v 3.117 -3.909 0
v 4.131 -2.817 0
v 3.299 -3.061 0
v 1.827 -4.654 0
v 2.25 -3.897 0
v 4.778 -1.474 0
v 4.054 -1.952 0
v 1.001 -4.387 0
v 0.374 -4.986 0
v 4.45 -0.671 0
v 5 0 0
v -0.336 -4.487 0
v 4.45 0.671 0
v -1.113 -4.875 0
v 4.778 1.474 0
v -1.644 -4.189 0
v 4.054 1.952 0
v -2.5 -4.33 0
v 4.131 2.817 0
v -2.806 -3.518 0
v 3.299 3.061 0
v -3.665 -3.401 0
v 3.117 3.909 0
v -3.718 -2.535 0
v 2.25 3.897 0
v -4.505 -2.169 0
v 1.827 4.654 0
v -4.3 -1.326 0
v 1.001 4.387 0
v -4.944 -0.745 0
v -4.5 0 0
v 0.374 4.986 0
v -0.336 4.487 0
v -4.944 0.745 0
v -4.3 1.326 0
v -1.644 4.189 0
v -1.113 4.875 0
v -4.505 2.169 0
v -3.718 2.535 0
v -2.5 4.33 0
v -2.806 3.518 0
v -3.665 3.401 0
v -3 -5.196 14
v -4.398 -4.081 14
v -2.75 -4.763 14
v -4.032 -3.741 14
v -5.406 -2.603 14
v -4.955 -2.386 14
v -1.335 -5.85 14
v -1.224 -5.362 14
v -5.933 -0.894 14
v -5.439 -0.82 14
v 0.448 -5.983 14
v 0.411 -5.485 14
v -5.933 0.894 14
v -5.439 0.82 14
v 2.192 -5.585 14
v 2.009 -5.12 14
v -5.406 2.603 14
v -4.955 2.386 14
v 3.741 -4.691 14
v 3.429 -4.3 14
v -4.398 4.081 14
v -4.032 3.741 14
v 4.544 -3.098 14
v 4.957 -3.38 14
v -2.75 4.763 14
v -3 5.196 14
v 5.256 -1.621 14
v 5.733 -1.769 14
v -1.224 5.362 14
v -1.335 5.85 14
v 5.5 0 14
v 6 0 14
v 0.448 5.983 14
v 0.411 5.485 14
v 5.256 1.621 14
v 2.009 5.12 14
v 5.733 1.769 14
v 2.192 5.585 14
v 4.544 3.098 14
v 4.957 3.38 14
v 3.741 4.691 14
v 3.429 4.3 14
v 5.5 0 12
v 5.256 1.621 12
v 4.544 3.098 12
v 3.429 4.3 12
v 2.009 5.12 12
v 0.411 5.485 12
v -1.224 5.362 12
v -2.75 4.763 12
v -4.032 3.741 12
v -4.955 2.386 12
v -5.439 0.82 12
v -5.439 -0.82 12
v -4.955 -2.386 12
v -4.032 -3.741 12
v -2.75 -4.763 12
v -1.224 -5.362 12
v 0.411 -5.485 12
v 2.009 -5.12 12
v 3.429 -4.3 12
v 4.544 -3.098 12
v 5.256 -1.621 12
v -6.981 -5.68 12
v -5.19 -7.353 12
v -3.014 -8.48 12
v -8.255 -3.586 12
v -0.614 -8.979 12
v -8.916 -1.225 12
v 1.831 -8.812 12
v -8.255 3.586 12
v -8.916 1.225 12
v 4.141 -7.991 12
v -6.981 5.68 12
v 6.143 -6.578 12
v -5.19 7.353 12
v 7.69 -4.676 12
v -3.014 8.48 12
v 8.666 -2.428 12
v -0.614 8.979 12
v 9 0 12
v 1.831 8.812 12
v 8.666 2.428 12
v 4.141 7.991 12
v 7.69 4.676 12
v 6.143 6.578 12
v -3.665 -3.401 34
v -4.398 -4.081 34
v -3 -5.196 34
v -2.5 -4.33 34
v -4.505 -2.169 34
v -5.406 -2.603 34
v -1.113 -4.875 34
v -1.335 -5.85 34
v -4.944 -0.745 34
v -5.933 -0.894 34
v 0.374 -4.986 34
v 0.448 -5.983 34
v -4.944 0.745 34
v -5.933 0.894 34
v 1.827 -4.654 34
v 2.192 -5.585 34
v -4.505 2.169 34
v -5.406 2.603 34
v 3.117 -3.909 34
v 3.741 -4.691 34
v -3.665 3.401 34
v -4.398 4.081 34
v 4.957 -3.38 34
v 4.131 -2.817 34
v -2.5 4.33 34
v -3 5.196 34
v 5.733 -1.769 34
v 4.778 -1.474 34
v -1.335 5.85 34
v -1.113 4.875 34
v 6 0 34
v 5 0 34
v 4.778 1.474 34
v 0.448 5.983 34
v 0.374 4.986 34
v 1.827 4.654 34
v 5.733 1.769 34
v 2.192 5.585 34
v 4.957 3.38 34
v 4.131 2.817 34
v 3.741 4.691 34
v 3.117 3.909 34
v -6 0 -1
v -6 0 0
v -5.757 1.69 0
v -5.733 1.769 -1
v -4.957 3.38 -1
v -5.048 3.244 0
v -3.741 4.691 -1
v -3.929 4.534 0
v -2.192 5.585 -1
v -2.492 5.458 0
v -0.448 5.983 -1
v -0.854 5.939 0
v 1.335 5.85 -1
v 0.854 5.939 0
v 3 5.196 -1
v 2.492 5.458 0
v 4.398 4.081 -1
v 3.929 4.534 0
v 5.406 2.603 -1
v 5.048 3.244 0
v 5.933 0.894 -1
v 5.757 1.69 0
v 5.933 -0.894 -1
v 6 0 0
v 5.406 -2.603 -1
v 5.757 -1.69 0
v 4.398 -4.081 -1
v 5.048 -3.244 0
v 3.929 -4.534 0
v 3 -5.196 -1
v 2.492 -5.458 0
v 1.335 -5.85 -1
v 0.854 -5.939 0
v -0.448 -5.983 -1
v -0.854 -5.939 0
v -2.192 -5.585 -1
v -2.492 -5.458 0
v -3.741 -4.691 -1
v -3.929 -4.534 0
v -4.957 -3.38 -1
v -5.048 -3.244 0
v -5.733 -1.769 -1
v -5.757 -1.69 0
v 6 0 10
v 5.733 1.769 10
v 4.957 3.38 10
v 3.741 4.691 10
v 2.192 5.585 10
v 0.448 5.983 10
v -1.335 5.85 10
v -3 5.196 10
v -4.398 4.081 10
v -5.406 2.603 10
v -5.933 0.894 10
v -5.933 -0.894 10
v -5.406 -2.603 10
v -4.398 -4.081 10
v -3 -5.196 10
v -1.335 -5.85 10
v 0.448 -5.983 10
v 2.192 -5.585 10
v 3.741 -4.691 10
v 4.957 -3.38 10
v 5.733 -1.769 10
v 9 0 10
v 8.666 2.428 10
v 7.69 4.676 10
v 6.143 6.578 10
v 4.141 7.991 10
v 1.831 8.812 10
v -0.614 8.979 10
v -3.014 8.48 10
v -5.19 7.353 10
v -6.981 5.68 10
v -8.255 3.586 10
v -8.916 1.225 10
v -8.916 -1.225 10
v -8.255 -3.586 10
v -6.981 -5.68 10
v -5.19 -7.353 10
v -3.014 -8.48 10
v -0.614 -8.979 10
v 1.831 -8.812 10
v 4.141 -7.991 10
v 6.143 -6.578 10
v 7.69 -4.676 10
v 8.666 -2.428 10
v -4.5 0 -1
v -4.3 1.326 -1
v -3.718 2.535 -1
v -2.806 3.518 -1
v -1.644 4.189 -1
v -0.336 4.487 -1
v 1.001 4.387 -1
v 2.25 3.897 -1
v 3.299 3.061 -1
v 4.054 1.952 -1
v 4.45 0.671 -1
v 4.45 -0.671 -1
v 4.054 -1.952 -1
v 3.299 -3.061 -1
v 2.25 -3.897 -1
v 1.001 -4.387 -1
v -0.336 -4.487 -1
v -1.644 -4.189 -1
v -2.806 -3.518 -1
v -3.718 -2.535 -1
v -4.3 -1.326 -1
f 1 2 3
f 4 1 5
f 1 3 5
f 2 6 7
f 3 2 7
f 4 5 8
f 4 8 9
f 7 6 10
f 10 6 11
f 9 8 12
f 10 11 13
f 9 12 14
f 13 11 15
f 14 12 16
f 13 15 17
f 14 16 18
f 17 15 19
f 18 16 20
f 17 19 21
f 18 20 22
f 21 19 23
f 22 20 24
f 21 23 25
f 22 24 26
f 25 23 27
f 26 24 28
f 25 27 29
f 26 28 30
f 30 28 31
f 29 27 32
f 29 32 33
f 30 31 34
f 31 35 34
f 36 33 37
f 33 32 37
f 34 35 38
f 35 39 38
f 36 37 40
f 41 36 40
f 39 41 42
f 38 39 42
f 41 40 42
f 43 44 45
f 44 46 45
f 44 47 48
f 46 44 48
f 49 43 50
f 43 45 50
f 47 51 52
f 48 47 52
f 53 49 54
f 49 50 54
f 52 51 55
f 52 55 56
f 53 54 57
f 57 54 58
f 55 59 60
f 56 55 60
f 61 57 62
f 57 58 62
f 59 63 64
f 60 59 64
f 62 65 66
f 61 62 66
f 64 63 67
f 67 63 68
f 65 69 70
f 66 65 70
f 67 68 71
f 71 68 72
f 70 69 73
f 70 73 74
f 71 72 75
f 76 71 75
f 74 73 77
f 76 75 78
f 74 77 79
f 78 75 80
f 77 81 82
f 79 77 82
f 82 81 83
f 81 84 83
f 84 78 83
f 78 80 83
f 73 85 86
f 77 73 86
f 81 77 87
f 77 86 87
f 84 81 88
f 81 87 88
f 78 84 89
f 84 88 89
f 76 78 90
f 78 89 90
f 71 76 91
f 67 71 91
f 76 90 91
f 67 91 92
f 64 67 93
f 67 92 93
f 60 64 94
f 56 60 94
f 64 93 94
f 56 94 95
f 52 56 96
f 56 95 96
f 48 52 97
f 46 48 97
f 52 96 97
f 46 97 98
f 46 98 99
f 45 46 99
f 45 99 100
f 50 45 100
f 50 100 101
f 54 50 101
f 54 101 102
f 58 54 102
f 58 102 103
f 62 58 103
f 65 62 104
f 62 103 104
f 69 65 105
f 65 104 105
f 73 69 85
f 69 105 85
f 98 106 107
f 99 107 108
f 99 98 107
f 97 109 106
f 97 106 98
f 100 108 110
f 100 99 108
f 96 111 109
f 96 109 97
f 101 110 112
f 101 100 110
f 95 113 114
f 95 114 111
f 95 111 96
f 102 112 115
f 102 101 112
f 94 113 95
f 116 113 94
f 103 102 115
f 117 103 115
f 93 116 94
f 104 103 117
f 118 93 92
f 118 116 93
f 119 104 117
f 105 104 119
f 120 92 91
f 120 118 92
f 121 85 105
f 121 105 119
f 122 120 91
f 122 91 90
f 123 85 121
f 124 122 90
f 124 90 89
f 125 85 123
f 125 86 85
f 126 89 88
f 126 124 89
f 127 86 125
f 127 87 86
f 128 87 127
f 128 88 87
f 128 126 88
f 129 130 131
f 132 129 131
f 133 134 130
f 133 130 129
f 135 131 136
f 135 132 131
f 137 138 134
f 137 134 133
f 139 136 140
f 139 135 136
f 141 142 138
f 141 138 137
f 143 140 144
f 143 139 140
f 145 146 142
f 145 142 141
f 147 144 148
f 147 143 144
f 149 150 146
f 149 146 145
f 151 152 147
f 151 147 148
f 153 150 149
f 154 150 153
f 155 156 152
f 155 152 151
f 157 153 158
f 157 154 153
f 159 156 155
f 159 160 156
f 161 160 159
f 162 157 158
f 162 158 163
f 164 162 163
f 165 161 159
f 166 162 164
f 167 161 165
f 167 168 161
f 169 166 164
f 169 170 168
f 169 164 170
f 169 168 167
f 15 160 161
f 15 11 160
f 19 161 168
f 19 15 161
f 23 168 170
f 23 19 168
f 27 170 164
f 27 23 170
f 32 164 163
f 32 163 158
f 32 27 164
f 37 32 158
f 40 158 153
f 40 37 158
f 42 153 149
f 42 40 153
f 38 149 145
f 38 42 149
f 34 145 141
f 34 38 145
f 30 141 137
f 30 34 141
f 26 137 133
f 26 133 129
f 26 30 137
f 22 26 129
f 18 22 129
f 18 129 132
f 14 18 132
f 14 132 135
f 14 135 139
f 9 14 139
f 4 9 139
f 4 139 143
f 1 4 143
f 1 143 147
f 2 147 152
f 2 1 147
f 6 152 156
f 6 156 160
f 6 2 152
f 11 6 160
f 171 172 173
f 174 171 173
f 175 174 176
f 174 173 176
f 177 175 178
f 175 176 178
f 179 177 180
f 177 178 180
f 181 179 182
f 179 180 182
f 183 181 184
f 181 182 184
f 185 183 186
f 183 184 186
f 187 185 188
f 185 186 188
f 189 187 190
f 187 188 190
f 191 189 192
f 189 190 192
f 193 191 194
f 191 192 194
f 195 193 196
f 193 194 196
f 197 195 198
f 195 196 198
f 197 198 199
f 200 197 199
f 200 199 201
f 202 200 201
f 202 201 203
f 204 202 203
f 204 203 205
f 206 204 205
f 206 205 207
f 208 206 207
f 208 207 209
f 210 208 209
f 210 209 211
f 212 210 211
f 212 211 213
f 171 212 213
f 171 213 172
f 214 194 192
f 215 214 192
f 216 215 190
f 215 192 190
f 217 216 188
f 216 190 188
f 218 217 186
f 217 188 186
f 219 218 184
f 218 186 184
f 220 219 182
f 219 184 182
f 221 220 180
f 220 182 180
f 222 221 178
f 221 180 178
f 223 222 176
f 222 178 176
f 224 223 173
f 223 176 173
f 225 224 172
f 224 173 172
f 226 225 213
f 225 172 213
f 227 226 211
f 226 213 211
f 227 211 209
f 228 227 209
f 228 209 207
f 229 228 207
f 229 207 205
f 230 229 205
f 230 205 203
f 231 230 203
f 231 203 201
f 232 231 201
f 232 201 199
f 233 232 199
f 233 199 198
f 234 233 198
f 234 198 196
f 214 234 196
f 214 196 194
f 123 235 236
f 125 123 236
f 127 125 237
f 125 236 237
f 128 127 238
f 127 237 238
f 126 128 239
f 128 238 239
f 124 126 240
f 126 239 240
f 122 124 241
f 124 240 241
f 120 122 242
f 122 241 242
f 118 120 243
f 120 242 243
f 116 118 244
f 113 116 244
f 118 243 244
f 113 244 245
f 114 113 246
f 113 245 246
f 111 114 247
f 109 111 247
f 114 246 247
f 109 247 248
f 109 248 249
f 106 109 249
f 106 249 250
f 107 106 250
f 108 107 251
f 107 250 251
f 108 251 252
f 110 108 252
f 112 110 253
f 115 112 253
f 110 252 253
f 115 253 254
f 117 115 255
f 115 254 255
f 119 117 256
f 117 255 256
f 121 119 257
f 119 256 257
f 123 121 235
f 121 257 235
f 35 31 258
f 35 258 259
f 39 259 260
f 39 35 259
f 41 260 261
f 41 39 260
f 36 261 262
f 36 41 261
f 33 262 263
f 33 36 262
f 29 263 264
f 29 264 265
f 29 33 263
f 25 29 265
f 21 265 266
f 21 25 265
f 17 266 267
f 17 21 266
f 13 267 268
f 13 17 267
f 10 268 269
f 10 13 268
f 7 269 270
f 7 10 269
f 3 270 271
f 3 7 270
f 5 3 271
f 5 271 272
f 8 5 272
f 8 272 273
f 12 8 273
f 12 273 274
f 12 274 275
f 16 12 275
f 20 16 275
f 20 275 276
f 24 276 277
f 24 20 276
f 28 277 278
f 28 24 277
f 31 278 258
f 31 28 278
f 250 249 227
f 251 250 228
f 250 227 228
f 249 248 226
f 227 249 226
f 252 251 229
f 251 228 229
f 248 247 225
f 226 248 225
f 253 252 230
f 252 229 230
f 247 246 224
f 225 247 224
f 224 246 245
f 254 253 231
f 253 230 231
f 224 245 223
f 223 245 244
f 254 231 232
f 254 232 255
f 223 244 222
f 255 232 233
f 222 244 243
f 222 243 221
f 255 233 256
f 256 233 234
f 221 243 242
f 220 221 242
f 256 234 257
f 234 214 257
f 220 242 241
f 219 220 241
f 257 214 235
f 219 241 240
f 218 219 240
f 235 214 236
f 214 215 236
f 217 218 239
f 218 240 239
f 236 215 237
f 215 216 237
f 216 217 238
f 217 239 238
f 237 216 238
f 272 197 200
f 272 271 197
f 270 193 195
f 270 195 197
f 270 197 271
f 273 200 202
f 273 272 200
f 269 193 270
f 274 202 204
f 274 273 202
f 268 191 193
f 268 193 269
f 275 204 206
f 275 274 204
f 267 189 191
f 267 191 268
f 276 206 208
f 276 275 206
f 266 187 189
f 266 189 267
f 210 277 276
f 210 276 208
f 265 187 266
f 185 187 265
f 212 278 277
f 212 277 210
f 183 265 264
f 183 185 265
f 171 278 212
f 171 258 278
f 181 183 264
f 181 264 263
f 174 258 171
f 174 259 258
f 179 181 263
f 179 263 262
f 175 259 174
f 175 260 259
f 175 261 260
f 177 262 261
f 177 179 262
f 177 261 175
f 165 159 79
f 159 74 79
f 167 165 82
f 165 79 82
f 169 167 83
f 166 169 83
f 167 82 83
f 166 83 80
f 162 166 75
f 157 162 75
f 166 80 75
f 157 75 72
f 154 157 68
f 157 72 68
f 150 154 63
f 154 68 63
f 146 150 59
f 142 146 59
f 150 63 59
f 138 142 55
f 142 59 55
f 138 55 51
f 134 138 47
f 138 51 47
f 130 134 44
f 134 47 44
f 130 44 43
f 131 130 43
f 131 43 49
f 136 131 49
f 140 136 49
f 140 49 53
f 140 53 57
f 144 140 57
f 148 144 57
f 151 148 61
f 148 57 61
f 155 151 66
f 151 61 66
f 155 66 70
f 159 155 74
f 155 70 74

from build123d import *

# Parameters (mm, degrees)
ESQUISSE1_R        = 6
ESQUISSE1_R_2      = 5
BOSS_EXTRU_1_DEPTH = 10
ESQUISSE2_R        = 6
ESQUISSE2_R_2      = 4.5
BOSS_EXTRU_2_DEPTH = 1
ESQUISSE3_R        = 9
ESQUISSE3_R_2      = 5
BOSS_EXTRU_3_DEPTH = 2
ESQUISSE4_R        = 5.5
ESQUISSE4_R_2      = 5
BOSS_EXTRU_4_DEPTH = 2
ESQUISSE5_R        = 6
ESQUISSE5_R_2      = 5
BOSS_EXTRU_5_DEPTH = 10
ESQUISSE6_R        = 6
ESQUISSE6_R_2      = 5
BOSS_EXTRU_6_DEPTH = 10


with BuildPart() as part:
    # Esquisse1 → Boss.-Extru.1 (new body)
    with BuildSketch(Plane.XY):
        Circle(ESQUISSE1_R)
        Circle(ESQUISSE1_R_2, mode=Mode.SUBTRACT)
    extrude(amount=BOSS_EXTRU_1_DEPTH)

    # Esquisse2 → Boss.-Extru.2 (add)
    with BuildSketch(Plane(origin=(0, 0, 0), x_dir=(-1, 0, 0), z_dir=(0, 0, -1))):
        Circle(ESQUISSE2_R)
        Circle(ESQUISSE2_R_2, mode=Mode.SUBTRACT)
    extrude(amount=BOSS_EXTRU_2_DEPTH)

    # Esquisse3 → Boss.-Extru.3 (add)
    with BuildSketch(Plane.XY.offset(10)):
        Circle(ESQUISSE3_R)
        Circle(ESQUISSE3_R_2, mode=Mode.SUBTRACT)
    extrude(amount=BOSS_EXTRU_3_DEPTH)

    # Esquisse4 → Boss.-Extru.4 (add)
    with BuildSketch(Plane.XY.offset(12)):
        Circle(ESQUISSE4_R)
        Circle(ESQUISSE4_R_2, mode=Mode.SUBTRACT)
    extrude(amount=BOSS_EXTRU_4_DEPTH)

    # Esquisse5 → Boss.-Extru.5 (add)
    with BuildSketch(Plane.XY.offset(14)):
        Circle(ESQUISSE5_R)
        Circle(ESQUISSE5_R_2, mode=Mode.SUBTRACT)
    extrude(amount=BOSS_EXTRU_5_DEPTH)

    # Esquisse6 → Boss.-Extru.6 (add)
    with BuildSketch(Plane.XY.offset(24)):
        Circle(ESQUISSE6_R)
        Circle(ESQUISSE6_R_2, mode=Mode.SUBTRACT)
    extrude(amount=BOSS_EXTRU_6_DEPTH)


solid = part.part
